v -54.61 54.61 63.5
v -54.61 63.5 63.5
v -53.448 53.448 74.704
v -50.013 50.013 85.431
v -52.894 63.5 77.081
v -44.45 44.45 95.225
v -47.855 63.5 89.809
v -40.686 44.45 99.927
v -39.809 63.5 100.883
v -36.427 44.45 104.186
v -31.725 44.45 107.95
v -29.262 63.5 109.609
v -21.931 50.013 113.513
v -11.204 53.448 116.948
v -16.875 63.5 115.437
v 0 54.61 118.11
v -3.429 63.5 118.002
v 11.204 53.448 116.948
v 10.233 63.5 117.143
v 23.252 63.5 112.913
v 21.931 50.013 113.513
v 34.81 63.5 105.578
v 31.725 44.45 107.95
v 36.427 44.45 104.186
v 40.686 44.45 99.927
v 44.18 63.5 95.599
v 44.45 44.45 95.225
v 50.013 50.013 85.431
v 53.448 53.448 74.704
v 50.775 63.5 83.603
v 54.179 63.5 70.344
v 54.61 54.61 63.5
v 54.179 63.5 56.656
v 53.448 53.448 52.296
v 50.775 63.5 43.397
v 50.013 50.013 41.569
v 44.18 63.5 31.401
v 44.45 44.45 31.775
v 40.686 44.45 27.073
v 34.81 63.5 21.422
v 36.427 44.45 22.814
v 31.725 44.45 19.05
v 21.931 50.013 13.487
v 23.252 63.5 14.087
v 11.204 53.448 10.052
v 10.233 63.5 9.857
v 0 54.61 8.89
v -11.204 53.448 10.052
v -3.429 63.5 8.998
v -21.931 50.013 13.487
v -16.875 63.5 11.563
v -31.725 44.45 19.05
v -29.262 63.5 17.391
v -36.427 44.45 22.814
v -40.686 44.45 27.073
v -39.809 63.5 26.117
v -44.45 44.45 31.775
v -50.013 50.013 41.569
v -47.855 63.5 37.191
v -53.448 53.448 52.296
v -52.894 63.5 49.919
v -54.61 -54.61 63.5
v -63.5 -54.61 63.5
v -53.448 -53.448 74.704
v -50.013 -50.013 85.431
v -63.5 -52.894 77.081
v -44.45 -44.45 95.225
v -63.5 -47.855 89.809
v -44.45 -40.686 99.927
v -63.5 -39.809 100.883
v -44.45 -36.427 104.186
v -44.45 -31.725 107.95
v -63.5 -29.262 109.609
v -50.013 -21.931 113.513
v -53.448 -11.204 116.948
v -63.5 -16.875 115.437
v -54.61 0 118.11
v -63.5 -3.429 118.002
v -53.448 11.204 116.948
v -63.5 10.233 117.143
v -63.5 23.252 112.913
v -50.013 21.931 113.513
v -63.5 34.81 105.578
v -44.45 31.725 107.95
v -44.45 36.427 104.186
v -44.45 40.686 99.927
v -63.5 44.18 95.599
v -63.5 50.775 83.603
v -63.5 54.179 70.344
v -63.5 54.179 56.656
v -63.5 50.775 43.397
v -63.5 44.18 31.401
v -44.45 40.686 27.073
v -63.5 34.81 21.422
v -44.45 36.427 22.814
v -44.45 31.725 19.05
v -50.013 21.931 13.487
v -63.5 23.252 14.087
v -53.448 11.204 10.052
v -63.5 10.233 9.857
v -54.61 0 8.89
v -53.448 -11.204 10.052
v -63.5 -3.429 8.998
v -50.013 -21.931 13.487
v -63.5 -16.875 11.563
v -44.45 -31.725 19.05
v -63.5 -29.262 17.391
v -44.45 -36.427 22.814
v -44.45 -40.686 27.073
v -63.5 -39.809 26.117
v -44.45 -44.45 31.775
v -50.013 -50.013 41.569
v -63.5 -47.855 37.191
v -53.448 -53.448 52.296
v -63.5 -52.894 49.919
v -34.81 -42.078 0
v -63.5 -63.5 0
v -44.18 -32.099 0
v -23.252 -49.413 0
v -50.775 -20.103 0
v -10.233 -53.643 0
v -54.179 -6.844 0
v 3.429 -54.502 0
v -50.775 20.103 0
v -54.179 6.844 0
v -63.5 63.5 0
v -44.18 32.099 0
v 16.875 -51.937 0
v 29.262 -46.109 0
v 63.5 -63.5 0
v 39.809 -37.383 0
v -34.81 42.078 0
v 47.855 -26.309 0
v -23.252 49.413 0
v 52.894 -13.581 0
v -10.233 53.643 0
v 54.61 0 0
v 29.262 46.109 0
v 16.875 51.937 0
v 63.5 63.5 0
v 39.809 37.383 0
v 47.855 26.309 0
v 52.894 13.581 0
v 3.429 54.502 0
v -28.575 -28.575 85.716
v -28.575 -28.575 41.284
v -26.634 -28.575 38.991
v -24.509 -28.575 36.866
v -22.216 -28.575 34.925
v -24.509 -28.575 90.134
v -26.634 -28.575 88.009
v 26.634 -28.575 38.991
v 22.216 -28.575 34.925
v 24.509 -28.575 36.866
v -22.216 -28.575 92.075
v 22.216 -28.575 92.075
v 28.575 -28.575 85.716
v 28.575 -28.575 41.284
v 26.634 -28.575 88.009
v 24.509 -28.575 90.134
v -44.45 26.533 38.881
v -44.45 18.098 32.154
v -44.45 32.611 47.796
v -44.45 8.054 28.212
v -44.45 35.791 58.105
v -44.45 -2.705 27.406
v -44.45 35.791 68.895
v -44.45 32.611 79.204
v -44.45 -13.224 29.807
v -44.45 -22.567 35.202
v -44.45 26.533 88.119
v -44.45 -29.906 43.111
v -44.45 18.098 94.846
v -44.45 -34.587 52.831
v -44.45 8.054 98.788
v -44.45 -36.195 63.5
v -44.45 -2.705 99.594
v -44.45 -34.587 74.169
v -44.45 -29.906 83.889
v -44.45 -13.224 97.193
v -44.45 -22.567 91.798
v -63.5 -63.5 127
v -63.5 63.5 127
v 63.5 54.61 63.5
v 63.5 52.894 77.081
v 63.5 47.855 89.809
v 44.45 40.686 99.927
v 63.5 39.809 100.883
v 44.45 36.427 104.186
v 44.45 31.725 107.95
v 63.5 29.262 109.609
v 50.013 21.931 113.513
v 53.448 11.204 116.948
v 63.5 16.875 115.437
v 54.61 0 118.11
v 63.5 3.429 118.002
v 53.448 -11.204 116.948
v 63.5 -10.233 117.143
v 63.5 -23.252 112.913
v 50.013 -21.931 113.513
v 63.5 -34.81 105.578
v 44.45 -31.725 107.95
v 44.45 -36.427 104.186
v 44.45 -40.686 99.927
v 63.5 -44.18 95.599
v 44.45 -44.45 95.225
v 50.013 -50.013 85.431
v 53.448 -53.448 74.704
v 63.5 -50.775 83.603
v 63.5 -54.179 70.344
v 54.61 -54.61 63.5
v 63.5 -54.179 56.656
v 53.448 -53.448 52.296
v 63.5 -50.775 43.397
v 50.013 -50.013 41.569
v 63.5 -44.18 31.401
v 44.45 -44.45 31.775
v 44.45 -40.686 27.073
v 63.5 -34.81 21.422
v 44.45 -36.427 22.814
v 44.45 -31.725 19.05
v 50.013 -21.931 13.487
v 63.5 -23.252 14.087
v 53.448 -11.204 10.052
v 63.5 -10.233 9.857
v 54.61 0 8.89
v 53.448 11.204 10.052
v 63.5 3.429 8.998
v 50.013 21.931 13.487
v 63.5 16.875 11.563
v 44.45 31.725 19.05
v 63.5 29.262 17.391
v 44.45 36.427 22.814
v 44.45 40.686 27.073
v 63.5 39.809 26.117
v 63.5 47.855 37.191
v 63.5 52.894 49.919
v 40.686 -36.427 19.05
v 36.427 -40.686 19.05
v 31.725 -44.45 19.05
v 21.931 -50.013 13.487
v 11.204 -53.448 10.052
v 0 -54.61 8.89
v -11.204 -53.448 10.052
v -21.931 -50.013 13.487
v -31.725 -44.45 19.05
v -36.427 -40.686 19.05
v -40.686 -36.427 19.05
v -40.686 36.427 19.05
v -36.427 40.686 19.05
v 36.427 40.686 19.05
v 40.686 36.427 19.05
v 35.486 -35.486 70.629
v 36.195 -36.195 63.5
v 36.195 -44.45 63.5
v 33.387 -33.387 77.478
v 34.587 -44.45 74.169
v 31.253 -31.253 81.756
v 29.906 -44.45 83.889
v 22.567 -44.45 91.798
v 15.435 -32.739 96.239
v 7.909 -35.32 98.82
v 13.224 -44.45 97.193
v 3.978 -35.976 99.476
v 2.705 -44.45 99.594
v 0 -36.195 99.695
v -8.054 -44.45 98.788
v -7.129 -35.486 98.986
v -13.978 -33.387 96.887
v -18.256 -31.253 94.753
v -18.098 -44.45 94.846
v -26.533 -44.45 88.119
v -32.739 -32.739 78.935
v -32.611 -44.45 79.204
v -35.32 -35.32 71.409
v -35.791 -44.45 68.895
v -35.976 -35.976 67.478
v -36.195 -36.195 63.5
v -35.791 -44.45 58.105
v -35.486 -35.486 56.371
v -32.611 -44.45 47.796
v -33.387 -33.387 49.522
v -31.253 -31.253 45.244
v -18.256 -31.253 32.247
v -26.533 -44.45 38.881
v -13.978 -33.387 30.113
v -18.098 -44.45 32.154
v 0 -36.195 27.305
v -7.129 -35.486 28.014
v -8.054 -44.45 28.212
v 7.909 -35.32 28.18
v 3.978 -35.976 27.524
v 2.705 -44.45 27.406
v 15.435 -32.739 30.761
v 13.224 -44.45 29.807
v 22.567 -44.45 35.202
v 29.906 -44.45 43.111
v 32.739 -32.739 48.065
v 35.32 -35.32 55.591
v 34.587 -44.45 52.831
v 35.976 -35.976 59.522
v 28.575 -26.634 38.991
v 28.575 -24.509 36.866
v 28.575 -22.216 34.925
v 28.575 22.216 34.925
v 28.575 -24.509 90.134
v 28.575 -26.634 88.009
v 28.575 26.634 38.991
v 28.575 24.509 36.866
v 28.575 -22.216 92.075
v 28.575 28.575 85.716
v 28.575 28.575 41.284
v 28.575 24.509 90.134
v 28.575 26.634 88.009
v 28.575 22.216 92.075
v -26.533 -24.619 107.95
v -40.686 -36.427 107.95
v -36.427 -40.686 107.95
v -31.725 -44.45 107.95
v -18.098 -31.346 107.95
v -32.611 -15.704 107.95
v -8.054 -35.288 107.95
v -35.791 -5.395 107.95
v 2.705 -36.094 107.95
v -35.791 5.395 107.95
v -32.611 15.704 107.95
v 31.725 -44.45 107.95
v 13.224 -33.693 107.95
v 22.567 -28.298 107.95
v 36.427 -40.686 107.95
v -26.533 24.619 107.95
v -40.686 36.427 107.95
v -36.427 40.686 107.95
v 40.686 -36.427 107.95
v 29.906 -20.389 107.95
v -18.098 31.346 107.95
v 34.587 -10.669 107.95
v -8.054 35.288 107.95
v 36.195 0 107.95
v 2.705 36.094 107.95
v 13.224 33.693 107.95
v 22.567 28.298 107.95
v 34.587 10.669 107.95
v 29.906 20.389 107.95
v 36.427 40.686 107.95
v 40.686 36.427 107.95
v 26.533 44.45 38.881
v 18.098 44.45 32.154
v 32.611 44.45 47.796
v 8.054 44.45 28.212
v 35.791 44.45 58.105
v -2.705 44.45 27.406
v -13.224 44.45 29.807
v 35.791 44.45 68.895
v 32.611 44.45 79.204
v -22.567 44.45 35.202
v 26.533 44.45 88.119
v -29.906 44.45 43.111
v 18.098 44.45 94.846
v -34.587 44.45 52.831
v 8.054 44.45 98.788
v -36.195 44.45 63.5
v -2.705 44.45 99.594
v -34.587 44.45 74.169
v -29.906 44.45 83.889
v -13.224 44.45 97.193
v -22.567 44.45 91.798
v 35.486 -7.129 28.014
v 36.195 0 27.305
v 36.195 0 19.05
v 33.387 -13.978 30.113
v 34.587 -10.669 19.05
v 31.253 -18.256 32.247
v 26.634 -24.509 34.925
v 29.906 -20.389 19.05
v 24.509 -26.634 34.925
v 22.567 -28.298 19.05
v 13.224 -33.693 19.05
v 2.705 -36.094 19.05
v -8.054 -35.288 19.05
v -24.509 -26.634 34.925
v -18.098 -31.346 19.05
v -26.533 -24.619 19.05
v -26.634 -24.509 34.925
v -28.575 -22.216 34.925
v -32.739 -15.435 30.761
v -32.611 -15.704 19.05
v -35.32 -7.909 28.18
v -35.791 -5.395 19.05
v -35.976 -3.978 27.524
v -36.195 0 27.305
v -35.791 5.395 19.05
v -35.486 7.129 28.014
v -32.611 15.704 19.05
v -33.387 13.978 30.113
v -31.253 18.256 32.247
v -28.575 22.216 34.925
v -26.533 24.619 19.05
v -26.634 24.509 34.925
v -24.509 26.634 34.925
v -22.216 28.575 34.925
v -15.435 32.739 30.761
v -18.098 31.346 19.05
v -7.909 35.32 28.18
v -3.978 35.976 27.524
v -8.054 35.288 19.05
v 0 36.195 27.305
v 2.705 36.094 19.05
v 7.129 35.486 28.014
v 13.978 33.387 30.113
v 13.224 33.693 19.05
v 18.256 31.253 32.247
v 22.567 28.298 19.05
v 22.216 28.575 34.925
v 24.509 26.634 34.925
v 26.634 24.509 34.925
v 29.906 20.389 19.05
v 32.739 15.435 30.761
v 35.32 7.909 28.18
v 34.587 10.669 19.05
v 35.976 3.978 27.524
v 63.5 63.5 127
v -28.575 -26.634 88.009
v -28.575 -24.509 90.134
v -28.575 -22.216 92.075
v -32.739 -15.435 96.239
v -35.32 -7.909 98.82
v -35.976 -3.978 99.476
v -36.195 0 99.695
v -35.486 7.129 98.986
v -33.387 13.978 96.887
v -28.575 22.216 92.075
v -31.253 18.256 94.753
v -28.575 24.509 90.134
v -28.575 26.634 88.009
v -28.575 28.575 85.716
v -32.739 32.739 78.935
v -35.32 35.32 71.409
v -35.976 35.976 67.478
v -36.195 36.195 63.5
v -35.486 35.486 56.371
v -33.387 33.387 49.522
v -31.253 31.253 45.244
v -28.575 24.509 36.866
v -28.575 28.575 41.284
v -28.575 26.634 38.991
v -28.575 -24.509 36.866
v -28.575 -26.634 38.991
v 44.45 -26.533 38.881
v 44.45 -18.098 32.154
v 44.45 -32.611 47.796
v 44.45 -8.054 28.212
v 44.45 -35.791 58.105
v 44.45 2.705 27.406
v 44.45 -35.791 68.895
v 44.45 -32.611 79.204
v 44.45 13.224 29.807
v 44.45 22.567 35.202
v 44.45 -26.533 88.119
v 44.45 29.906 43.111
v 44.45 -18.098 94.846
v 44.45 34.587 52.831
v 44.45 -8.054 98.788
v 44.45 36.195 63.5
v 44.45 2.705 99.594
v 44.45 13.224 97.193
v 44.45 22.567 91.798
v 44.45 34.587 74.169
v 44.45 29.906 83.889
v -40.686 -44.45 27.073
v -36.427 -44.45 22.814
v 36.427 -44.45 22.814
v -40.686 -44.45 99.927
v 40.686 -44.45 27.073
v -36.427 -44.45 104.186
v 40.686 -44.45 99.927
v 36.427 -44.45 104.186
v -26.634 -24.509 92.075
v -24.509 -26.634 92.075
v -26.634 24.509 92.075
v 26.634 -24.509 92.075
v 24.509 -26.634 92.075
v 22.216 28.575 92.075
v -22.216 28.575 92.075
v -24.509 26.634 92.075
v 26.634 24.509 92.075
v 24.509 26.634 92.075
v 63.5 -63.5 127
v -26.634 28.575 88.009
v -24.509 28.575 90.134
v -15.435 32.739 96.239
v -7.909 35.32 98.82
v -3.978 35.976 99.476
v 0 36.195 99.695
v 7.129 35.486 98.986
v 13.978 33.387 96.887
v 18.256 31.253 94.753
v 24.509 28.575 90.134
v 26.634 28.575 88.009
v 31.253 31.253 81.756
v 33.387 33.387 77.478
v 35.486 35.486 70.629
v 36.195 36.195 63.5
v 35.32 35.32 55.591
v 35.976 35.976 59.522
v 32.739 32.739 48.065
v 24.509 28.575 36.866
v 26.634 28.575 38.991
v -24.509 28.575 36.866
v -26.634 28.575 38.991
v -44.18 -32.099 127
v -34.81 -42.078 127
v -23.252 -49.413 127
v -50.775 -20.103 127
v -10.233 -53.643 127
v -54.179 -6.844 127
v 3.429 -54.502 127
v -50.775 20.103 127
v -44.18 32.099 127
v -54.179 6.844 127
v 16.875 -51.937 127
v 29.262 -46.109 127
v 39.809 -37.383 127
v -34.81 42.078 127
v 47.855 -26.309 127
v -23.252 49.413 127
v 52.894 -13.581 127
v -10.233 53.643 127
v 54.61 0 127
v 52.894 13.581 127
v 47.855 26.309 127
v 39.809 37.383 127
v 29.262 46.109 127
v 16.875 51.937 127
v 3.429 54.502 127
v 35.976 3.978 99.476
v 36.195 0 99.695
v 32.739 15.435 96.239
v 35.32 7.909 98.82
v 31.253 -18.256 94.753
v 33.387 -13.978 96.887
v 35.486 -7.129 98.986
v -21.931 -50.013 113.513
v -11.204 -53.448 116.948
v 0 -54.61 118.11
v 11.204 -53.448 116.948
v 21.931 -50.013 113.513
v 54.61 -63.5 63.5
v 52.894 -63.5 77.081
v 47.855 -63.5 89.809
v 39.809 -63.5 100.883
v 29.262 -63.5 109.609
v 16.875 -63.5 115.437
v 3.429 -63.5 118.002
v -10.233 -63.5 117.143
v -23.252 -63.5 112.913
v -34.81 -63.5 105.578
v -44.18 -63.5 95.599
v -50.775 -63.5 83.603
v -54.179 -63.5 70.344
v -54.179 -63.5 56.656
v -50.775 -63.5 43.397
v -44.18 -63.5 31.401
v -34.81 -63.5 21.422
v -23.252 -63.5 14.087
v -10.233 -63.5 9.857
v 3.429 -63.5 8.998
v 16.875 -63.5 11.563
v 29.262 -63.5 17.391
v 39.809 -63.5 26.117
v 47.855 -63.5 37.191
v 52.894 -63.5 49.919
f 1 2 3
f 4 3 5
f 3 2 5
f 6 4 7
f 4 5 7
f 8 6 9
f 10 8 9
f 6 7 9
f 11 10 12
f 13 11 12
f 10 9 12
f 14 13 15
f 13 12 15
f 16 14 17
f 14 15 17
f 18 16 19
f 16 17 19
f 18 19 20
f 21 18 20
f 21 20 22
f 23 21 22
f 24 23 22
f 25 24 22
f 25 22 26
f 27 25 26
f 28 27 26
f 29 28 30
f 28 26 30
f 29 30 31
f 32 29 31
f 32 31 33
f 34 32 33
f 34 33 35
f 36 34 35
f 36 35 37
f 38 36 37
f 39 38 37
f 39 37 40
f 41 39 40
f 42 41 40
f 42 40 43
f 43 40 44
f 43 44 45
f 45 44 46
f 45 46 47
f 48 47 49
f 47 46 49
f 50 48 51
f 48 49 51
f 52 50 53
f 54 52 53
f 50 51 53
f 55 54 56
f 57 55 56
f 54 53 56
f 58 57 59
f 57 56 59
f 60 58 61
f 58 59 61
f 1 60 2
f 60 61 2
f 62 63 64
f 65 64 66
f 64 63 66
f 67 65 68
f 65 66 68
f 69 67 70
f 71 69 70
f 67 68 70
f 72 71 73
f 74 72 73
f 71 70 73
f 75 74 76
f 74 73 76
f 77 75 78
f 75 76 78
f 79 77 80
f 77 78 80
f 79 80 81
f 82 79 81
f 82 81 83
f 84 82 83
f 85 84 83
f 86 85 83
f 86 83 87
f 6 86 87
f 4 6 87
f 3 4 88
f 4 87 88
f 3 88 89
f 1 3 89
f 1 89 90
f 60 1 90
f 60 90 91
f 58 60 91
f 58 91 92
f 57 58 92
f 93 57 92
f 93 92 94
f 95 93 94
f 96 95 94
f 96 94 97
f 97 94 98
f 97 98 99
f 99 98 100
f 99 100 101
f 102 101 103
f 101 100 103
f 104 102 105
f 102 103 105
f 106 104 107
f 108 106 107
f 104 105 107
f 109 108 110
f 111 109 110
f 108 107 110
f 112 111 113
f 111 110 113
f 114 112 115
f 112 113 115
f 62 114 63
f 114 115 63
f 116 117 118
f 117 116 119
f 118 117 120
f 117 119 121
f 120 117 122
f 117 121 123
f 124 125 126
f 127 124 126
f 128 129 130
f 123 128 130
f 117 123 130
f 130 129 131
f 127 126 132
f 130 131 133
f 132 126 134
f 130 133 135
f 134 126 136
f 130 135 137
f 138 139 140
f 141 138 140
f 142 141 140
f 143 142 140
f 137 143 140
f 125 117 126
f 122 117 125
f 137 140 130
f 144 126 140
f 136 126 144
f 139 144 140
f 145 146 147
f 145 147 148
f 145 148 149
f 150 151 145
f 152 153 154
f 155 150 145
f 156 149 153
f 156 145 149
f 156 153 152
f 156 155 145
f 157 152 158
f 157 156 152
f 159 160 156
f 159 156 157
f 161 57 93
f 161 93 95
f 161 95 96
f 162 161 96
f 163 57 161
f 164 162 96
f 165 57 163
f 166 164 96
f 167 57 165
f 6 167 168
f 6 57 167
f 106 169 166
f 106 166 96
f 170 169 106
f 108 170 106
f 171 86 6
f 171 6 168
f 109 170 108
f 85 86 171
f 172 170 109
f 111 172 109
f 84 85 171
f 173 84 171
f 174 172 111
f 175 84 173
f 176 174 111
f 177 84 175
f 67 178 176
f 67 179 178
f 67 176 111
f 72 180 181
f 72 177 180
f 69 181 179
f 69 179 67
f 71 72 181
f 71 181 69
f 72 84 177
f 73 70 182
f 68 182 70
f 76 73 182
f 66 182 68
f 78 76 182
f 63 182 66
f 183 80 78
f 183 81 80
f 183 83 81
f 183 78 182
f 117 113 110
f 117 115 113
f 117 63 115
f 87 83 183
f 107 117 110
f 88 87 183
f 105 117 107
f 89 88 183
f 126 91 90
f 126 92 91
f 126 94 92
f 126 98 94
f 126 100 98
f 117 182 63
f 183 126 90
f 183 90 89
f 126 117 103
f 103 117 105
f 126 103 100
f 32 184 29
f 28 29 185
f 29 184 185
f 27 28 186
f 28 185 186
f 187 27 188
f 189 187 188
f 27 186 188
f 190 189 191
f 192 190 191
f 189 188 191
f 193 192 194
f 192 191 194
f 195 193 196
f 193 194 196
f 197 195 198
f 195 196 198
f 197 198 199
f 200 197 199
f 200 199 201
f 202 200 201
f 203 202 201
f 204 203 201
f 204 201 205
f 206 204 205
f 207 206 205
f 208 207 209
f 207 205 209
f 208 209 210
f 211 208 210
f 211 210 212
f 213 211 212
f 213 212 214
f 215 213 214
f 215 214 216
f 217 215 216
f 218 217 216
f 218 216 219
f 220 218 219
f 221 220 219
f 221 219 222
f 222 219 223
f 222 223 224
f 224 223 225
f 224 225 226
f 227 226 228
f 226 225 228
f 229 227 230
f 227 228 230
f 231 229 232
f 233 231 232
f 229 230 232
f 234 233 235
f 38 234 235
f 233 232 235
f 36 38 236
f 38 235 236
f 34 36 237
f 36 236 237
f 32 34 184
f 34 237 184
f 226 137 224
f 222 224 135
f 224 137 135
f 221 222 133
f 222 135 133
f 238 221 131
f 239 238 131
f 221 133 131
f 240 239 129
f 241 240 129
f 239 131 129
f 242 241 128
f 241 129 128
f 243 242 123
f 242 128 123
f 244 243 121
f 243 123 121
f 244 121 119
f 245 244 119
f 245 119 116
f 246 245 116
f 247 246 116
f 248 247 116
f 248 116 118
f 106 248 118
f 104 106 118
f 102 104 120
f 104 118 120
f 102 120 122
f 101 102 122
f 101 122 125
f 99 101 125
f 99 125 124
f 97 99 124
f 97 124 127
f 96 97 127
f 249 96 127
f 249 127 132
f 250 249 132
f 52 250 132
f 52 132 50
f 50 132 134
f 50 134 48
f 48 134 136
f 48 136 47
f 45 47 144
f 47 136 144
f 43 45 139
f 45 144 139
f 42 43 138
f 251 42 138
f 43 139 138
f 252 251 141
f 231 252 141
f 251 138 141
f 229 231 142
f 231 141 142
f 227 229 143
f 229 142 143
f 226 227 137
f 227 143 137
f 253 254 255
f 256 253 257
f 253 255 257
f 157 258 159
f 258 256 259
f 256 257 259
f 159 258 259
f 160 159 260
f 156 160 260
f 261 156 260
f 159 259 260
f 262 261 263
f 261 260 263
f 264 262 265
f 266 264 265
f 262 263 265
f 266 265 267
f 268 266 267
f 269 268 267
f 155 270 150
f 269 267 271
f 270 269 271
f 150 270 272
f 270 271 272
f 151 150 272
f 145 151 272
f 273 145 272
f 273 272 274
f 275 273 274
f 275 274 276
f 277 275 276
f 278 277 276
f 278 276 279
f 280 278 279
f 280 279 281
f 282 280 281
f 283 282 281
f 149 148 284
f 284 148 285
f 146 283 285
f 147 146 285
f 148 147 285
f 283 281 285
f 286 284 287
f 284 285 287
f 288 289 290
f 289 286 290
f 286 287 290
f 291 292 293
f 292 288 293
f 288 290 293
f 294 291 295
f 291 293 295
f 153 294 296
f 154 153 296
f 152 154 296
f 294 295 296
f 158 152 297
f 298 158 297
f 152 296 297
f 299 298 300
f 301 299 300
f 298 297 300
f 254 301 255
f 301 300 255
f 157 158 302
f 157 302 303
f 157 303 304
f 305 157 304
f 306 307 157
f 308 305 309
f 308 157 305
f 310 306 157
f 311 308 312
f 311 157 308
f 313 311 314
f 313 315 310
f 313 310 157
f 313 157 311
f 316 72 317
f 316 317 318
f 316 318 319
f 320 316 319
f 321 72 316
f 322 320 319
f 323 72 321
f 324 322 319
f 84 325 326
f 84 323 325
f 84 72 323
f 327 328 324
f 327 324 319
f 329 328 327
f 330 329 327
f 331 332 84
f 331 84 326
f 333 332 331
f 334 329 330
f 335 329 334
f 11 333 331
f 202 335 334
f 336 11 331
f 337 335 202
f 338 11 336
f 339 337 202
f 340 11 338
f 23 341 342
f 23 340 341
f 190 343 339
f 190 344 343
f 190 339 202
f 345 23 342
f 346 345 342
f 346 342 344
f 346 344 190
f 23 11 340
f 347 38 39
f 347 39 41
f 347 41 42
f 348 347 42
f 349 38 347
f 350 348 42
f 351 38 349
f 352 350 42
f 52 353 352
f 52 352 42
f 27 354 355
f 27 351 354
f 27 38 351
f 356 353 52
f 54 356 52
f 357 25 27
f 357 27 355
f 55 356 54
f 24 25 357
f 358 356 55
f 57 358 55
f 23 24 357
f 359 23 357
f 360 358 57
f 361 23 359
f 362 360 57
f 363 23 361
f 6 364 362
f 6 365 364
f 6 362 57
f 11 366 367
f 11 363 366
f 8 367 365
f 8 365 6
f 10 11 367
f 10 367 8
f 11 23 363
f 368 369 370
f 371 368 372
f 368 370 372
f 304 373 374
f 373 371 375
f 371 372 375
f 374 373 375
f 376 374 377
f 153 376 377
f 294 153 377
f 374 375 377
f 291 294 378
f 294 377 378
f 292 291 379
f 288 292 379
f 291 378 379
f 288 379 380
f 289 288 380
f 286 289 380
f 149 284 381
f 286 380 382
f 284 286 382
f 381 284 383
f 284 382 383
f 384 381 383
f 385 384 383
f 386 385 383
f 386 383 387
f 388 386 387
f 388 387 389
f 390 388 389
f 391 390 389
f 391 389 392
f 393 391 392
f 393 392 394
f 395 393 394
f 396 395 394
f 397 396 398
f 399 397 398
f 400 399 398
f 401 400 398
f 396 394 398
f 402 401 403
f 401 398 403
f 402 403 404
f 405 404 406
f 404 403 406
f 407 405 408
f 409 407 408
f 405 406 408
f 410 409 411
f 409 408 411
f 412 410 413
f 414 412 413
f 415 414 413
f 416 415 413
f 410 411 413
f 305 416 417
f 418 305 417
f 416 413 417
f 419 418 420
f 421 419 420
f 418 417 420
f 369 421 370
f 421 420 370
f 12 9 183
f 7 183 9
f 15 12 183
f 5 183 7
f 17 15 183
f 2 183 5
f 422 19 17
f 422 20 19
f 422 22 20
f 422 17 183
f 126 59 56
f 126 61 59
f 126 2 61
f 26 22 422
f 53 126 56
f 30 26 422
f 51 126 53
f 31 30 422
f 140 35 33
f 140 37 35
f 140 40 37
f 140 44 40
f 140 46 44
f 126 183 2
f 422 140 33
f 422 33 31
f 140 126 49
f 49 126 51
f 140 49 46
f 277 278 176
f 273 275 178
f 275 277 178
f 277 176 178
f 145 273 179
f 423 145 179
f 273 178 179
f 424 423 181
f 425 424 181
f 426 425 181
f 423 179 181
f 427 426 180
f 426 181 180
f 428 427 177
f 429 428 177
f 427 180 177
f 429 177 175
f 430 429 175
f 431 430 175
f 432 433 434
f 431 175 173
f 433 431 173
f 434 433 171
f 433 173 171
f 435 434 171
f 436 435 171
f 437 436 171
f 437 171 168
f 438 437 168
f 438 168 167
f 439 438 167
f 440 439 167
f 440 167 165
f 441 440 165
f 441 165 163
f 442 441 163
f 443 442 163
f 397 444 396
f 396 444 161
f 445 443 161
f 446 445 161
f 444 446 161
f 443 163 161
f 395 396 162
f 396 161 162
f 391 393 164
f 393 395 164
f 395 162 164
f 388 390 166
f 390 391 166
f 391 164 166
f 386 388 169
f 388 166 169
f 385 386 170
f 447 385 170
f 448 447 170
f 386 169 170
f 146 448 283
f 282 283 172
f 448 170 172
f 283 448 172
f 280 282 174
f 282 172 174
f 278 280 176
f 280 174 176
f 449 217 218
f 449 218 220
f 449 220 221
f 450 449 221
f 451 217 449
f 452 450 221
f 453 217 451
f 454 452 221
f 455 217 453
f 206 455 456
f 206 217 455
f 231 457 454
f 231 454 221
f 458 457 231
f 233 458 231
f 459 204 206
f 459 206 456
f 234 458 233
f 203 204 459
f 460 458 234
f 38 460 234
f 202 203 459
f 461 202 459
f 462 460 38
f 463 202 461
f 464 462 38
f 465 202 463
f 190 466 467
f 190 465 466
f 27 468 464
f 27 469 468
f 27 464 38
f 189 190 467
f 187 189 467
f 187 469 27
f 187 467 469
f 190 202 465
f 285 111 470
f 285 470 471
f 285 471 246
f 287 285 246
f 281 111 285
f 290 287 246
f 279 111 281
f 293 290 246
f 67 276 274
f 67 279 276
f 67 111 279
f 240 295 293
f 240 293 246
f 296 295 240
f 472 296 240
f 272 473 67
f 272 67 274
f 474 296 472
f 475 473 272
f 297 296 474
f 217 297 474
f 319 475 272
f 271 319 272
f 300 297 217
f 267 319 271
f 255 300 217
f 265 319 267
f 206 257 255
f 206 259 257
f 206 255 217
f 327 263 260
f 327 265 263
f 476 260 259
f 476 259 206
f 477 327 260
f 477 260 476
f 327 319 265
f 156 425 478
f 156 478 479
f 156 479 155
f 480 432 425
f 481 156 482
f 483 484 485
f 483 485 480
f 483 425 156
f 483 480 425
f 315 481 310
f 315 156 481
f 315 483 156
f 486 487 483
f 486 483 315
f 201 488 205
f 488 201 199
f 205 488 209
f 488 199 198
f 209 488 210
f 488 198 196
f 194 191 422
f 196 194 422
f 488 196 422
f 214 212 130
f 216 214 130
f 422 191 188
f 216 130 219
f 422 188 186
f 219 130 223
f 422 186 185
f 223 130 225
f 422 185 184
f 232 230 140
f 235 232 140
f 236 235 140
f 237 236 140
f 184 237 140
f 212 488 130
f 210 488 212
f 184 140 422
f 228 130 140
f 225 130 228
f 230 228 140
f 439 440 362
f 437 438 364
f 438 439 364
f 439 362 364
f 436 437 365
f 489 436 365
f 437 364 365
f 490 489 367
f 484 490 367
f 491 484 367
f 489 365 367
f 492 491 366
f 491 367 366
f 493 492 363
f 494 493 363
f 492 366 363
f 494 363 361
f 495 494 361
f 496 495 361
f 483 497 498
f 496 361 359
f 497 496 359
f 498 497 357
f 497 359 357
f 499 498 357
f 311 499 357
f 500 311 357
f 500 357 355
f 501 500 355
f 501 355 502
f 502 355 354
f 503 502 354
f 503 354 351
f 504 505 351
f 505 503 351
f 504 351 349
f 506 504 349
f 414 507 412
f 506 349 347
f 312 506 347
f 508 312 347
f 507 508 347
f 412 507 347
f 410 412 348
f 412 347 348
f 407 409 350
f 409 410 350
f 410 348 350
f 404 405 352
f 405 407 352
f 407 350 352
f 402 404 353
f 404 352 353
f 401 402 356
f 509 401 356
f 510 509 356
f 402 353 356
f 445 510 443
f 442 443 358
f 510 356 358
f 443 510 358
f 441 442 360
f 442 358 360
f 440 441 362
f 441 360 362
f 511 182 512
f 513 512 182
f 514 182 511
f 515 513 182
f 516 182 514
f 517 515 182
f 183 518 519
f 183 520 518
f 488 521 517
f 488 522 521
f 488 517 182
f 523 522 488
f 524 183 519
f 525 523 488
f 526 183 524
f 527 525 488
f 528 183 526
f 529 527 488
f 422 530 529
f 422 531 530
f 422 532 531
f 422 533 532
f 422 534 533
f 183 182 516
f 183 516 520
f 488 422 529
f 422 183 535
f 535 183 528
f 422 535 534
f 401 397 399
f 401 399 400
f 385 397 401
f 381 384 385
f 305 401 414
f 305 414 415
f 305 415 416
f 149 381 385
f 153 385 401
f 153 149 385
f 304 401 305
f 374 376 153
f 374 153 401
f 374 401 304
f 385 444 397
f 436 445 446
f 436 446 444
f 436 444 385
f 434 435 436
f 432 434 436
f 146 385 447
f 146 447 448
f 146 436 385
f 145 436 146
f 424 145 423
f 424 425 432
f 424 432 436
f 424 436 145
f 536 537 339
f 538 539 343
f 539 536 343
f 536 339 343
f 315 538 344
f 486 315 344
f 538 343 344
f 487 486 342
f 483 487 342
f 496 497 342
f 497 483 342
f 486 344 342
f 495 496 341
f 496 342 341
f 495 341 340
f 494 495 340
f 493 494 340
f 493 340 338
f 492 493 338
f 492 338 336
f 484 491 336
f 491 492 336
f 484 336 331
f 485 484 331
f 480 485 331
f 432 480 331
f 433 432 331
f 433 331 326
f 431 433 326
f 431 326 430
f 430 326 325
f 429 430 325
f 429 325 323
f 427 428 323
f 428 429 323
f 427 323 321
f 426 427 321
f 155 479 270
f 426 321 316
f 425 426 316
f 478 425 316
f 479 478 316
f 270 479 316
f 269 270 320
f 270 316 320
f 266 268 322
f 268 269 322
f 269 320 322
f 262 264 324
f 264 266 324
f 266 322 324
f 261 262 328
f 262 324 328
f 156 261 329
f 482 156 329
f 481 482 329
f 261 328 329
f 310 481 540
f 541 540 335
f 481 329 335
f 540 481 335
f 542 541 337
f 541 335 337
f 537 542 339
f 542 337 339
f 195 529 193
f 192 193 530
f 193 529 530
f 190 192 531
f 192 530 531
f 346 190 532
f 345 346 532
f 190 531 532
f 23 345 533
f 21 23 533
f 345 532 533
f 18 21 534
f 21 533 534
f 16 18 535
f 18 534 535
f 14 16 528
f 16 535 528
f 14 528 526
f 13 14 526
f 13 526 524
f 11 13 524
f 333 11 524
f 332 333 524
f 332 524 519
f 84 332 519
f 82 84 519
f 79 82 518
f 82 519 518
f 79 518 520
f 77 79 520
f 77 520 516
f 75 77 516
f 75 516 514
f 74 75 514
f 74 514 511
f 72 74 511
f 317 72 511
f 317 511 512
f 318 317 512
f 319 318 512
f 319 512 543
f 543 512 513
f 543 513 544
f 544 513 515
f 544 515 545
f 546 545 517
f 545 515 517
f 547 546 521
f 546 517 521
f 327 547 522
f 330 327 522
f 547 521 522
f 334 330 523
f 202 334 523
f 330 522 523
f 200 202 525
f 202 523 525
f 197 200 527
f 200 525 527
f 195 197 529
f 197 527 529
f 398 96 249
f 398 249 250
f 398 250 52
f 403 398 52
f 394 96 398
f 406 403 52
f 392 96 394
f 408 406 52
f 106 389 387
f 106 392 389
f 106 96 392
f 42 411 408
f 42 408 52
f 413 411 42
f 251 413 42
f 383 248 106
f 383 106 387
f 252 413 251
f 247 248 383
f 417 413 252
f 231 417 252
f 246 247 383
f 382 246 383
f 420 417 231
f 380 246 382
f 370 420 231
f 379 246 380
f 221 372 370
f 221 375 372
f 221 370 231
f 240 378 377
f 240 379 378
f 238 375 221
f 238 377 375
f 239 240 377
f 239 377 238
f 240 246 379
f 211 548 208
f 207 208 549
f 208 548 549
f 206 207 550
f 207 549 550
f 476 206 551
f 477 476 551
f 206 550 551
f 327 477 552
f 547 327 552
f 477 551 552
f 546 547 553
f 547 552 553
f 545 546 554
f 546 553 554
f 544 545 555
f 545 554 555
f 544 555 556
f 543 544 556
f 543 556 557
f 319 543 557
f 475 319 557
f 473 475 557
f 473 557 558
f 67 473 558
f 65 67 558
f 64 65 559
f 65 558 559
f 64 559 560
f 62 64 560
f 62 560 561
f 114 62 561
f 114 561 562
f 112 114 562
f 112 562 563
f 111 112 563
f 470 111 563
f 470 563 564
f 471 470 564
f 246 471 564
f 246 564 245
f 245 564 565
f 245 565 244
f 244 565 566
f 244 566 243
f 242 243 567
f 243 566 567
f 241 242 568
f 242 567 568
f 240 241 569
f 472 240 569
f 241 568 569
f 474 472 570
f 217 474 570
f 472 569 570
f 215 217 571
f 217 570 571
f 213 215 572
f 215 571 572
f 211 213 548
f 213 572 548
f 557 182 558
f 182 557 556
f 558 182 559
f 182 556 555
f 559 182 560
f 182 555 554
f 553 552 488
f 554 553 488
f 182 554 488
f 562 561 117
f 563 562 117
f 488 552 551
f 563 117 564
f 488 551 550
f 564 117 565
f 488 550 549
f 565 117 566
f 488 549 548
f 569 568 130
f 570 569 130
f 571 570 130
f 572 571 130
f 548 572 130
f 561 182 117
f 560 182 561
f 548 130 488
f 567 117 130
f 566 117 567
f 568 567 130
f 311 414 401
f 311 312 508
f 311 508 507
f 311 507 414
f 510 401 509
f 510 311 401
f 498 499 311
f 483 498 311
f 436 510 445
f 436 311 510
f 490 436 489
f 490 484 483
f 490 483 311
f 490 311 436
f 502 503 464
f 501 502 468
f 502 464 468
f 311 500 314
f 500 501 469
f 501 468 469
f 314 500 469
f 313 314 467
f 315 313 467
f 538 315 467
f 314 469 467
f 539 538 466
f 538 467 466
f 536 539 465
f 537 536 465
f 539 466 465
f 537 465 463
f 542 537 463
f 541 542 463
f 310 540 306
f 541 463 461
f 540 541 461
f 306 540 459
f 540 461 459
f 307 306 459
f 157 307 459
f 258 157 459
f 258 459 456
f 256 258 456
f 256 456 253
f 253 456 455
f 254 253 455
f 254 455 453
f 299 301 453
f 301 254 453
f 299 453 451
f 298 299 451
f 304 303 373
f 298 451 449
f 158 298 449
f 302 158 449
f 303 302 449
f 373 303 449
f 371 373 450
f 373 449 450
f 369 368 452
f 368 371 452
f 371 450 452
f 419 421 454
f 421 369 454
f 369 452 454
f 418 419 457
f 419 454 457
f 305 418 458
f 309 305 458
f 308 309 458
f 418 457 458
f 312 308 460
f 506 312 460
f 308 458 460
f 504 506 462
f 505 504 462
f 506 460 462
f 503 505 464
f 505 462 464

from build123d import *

# Parameters (mm, degrees)
F15_W     = 127
F15_H     = 127
F16_DEPTH = 127
F0_R      = 54.61
F17_DEPTH = 19.05
F18_R     = 54.61
F1_DEPTH  = 19.05
F19_R     = 54.61
F2_DEPTH  = 19.05
F3_R      = 54.61
F4_DEPTH  = 19.05
F20_R     = 54.61
F5_DEPTH  = 19.05
F6_R      = 54.61
F21_DEPTH = 19.05
F22_R     = 36.195
F7_DEPTH  = 15.875
F8_R      = 36.195
F9_DEPTH  = 15.875
F23_R     = 36.195
F10_DEPTH = 15.875
F11_R     = 36.195
F24_DEPTH = 15.875
F25_R     = 36.195
F12_DEPTH = 15.875
F13_R     = 36.195
F14_DEPTH = 15.875


with BuildPart() as f16:
    # F15 (on Top) → F16 (new body)
    with BuildSketch(Plane.XY):
        Rectangle(F15_W, F15_H)
    extrude(amount=F16_DEPTH)

    # F0 (on face) → F17 (cut)
    with BuildSketch(Plane.XY.offset(127)):
        Circle(F0_R)
    extrude(amount=-F17_DEPTH, mode=Mode.SUBTRACT)

    # F18 (on face) → F1 (cut)
    with BuildSketch(Plane.XZ.offset(63.5)):
        with Locations((0, 63.5)):
            Circle(F18_R)
    extrude(amount=-F1_DEPTH, mode=Mode.SUBTRACT)

    # F19 (on face) → F2 (cut)
    with BuildSketch(Plane(origin=(0, 63.5, 0), x_dir=(-1, 0, 0), z_dir=(0, 1, 0))):
        with Locations((0, 63.5)):
            Circle(F19_R)
    extrude(amount=-F2_DEPTH, mode=Mode.SUBTRACT)

    # F3 (on face) → F4 (cut)
    with BuildSketch(Plane.YZ.offset(63.5)):
        with Locations((0, 63.5)):
            Circle(F3_R)
    extrude(amount=-F4_DEPTH, mode=Mode.SUBTRACT)

    # F20 (on face) → F5 (cut)
    with BuildSketch(Plane(origin=(-63.5, 0, 0), x_dir=(0, -1, 0), z_dir=(-1, 0, 0))):
        with Locations((0, 63.5)):
            Circle(F20_R)
    extrude(amount=-F5_DEPTH, mode=Mode.SUBTRACT)

    # F6 (on face) → F21 (cut)
    with BuildSketch(Plane(origin=(0, 0, 0), x_dir=(1, 0, 0), z_dir=(0, 0, -1))):
        Circle(F6_R)
    extrude(amount=-F21_DEPTH, mode=Mode.SUBTRACT)

    # F22 (on face) → F7 (cut)
    with BuildSketch(Plane(origin=(0, 0, 19.05), x_dir=(1, 0, 0), z_dir=(0, 0, -1))):
        Circle(F22_R)
    extrude(amount=-F7_DEPTH, mode=Mode.SUBTRACT)

    # F8 (on face) → F9 (cut)
    with BuildSketch(Plane.XZ.offset(44.45)):
        with Locations((0, 63.5)):
            Circle(F8_R)
    extrude(amount=-F9_DEPTH, mode=Mode.SUBTRACT)

    # F23 (on face) → F10 (cut)
    with BuildSketch(Plane.YZ.offset(44.45)):
        with Locations((0, 63.5)):
            Circle(F23_R)
    extrude(amount=-F10_DEPTH, mode=Mode.SUBTRACT)

    # F11 (on face) → F24 (cut)
    with BuildSketch(Plane(origin=(-44.45, 0, 0), x_dir=(0, -1, 0), z_dir=(-1, 0, 0))):
        with Locations((0, 63.5)):
            Circle(F11_R)
    extrude(amount=-F24_DEPTH, mode=Mode.SUBTRACT)

    # F25 (on face) → F12 (cut)
    with BuildSketch(Plane(origin=(0, 44.45, 0), x_dir=(-1, 0, 0), z_dir=(0, 1, 0))):
        with Locations((0, 63.5)):
            Circle(F25_R)
    extrude(amount=-F12_DEPTH, mode=Mode.SUBTRACT)

    # F13 (on face) → F14 (cut)
    with BuildSketch(Plane.XY.offset(107.95)):
        Circle(F13_R)
    extrude(amount=-F14_DEPTH, mode=Mode.SUBTRACT)


solid = f16.part
